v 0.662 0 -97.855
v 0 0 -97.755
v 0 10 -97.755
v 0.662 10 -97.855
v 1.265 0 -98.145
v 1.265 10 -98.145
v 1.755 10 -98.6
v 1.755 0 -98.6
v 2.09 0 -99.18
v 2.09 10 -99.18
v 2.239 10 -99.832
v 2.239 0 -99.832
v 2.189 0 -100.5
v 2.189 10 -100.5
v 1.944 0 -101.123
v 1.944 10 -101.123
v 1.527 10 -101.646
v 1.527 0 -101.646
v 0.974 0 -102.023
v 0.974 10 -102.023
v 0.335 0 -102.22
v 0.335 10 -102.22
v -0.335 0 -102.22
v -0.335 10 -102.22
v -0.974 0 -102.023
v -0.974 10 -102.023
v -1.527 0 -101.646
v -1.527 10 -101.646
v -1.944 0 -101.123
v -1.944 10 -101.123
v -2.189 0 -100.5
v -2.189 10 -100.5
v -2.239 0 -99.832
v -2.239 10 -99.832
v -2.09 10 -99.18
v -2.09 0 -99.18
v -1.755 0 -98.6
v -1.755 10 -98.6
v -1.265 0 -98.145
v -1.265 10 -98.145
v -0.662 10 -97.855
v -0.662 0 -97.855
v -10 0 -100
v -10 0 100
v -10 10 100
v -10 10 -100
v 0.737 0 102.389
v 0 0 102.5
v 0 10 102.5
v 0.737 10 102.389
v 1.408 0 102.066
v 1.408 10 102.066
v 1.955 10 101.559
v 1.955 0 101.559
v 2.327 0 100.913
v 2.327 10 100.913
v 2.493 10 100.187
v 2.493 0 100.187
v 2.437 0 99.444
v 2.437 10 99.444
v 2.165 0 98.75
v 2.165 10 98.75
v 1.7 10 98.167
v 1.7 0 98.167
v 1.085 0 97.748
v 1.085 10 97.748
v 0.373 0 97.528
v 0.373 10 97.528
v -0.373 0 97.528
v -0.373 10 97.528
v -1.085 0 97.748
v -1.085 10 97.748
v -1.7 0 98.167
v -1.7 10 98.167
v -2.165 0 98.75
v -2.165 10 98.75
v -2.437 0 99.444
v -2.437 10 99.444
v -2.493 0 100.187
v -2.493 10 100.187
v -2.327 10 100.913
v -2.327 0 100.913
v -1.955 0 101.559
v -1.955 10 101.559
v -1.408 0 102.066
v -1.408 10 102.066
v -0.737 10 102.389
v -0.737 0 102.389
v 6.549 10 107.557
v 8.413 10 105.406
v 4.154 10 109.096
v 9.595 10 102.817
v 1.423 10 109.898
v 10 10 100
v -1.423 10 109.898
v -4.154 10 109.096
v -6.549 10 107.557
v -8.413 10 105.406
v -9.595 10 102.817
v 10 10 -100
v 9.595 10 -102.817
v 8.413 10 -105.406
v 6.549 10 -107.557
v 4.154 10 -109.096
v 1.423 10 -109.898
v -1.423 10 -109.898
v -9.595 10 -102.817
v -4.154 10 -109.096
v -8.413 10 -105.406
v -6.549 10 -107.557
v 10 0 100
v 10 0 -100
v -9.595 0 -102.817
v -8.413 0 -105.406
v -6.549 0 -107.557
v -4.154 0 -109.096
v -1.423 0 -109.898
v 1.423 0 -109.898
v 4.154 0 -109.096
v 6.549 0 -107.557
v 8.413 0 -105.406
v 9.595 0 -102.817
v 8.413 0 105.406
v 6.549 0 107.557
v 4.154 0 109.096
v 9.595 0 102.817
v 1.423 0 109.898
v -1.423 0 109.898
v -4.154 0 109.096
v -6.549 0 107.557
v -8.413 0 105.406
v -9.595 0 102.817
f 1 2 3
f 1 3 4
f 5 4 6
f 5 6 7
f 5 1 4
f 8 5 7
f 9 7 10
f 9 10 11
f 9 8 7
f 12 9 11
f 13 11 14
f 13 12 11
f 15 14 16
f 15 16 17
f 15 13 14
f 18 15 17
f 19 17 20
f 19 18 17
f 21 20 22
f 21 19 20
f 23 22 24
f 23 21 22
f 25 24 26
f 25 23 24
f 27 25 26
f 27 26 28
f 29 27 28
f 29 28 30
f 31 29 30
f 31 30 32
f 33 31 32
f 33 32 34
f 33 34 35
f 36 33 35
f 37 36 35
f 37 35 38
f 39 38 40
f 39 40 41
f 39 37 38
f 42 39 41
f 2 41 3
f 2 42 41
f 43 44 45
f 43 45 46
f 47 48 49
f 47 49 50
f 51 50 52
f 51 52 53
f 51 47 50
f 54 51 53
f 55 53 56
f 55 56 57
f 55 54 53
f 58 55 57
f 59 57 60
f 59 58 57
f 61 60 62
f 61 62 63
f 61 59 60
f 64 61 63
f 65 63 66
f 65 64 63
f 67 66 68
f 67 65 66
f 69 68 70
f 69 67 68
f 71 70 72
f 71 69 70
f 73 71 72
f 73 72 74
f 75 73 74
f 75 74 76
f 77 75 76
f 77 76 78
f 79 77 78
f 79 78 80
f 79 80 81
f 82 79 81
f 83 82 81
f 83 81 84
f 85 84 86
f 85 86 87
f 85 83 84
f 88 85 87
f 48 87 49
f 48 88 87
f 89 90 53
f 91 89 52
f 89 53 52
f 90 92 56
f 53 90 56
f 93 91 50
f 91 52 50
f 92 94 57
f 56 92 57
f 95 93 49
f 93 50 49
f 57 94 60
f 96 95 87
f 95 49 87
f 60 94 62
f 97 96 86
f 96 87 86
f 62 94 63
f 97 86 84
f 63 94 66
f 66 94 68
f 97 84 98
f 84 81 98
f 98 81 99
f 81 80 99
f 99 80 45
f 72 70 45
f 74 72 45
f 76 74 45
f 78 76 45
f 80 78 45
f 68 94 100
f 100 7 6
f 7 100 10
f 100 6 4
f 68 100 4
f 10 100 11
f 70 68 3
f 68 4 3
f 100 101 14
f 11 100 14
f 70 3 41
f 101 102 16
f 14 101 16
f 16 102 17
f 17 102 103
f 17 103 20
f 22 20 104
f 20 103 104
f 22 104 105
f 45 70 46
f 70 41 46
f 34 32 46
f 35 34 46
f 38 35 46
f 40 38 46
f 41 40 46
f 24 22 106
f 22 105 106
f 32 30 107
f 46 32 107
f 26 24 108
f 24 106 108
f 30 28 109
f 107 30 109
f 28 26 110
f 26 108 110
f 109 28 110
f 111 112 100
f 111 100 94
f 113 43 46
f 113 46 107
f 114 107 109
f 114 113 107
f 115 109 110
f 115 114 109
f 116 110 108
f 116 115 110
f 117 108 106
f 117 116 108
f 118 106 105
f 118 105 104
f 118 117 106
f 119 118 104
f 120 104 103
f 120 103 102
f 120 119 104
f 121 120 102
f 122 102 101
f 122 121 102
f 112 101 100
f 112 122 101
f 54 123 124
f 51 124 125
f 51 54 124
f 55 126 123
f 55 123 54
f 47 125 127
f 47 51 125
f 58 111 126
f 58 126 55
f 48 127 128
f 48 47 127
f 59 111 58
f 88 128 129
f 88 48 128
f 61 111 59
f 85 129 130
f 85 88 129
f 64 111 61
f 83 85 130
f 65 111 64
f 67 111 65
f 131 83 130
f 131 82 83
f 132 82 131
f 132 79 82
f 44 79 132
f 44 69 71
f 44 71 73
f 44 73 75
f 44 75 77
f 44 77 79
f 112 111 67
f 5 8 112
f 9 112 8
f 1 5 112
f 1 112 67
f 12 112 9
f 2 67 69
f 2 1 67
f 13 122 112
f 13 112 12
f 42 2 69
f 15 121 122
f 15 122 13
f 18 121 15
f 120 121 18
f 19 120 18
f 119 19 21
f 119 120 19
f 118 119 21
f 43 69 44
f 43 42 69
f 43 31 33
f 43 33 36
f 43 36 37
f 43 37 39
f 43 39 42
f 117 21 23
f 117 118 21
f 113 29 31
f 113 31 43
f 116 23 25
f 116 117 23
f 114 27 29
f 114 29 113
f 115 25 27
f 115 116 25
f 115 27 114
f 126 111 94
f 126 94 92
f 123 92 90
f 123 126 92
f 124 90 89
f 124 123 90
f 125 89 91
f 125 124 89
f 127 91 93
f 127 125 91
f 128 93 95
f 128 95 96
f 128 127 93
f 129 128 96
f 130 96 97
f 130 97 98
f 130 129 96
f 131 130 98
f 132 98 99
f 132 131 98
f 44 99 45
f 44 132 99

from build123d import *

# Parameters (mm, degrees)
SKETCH1_R           = 2.24506403
SKETCH1_R_2         = 2.5
BOSS_EXTRUDE1_DEPTH = 10


with BuildPart() as part:
    # Sketch1 → Boss-Extrude1 (new body)
    with BuildSketch(Plane(origin=(0, 0, 0), x_dir=(1, 0, 0), z_dir=(0, 1, 0))):
        with BuildLine():
            ThreePointArc((10, -100), (0, -110), (-10, -100))
            Line((-10, -100), (-10, 100))
            ThreePointArc((-10, 100), (0, 110), (10, 100))
            Line((10, 100), (10, -100))
        make_face()
        with Locations(Location((0, 100, 0), (0, 0, 270))):
            Circle(SKETCH1_R, mode=Mode.SUBTRACT)
        with Locations(Location((0, -100, 0), (0, 0, 270))):
            Circle(SKETCH1_R_2, mode=Mode.SUBTRACT)
    extrude(amount=BOSS_EXTRUDE1_DEPTH)


solid = part.part
